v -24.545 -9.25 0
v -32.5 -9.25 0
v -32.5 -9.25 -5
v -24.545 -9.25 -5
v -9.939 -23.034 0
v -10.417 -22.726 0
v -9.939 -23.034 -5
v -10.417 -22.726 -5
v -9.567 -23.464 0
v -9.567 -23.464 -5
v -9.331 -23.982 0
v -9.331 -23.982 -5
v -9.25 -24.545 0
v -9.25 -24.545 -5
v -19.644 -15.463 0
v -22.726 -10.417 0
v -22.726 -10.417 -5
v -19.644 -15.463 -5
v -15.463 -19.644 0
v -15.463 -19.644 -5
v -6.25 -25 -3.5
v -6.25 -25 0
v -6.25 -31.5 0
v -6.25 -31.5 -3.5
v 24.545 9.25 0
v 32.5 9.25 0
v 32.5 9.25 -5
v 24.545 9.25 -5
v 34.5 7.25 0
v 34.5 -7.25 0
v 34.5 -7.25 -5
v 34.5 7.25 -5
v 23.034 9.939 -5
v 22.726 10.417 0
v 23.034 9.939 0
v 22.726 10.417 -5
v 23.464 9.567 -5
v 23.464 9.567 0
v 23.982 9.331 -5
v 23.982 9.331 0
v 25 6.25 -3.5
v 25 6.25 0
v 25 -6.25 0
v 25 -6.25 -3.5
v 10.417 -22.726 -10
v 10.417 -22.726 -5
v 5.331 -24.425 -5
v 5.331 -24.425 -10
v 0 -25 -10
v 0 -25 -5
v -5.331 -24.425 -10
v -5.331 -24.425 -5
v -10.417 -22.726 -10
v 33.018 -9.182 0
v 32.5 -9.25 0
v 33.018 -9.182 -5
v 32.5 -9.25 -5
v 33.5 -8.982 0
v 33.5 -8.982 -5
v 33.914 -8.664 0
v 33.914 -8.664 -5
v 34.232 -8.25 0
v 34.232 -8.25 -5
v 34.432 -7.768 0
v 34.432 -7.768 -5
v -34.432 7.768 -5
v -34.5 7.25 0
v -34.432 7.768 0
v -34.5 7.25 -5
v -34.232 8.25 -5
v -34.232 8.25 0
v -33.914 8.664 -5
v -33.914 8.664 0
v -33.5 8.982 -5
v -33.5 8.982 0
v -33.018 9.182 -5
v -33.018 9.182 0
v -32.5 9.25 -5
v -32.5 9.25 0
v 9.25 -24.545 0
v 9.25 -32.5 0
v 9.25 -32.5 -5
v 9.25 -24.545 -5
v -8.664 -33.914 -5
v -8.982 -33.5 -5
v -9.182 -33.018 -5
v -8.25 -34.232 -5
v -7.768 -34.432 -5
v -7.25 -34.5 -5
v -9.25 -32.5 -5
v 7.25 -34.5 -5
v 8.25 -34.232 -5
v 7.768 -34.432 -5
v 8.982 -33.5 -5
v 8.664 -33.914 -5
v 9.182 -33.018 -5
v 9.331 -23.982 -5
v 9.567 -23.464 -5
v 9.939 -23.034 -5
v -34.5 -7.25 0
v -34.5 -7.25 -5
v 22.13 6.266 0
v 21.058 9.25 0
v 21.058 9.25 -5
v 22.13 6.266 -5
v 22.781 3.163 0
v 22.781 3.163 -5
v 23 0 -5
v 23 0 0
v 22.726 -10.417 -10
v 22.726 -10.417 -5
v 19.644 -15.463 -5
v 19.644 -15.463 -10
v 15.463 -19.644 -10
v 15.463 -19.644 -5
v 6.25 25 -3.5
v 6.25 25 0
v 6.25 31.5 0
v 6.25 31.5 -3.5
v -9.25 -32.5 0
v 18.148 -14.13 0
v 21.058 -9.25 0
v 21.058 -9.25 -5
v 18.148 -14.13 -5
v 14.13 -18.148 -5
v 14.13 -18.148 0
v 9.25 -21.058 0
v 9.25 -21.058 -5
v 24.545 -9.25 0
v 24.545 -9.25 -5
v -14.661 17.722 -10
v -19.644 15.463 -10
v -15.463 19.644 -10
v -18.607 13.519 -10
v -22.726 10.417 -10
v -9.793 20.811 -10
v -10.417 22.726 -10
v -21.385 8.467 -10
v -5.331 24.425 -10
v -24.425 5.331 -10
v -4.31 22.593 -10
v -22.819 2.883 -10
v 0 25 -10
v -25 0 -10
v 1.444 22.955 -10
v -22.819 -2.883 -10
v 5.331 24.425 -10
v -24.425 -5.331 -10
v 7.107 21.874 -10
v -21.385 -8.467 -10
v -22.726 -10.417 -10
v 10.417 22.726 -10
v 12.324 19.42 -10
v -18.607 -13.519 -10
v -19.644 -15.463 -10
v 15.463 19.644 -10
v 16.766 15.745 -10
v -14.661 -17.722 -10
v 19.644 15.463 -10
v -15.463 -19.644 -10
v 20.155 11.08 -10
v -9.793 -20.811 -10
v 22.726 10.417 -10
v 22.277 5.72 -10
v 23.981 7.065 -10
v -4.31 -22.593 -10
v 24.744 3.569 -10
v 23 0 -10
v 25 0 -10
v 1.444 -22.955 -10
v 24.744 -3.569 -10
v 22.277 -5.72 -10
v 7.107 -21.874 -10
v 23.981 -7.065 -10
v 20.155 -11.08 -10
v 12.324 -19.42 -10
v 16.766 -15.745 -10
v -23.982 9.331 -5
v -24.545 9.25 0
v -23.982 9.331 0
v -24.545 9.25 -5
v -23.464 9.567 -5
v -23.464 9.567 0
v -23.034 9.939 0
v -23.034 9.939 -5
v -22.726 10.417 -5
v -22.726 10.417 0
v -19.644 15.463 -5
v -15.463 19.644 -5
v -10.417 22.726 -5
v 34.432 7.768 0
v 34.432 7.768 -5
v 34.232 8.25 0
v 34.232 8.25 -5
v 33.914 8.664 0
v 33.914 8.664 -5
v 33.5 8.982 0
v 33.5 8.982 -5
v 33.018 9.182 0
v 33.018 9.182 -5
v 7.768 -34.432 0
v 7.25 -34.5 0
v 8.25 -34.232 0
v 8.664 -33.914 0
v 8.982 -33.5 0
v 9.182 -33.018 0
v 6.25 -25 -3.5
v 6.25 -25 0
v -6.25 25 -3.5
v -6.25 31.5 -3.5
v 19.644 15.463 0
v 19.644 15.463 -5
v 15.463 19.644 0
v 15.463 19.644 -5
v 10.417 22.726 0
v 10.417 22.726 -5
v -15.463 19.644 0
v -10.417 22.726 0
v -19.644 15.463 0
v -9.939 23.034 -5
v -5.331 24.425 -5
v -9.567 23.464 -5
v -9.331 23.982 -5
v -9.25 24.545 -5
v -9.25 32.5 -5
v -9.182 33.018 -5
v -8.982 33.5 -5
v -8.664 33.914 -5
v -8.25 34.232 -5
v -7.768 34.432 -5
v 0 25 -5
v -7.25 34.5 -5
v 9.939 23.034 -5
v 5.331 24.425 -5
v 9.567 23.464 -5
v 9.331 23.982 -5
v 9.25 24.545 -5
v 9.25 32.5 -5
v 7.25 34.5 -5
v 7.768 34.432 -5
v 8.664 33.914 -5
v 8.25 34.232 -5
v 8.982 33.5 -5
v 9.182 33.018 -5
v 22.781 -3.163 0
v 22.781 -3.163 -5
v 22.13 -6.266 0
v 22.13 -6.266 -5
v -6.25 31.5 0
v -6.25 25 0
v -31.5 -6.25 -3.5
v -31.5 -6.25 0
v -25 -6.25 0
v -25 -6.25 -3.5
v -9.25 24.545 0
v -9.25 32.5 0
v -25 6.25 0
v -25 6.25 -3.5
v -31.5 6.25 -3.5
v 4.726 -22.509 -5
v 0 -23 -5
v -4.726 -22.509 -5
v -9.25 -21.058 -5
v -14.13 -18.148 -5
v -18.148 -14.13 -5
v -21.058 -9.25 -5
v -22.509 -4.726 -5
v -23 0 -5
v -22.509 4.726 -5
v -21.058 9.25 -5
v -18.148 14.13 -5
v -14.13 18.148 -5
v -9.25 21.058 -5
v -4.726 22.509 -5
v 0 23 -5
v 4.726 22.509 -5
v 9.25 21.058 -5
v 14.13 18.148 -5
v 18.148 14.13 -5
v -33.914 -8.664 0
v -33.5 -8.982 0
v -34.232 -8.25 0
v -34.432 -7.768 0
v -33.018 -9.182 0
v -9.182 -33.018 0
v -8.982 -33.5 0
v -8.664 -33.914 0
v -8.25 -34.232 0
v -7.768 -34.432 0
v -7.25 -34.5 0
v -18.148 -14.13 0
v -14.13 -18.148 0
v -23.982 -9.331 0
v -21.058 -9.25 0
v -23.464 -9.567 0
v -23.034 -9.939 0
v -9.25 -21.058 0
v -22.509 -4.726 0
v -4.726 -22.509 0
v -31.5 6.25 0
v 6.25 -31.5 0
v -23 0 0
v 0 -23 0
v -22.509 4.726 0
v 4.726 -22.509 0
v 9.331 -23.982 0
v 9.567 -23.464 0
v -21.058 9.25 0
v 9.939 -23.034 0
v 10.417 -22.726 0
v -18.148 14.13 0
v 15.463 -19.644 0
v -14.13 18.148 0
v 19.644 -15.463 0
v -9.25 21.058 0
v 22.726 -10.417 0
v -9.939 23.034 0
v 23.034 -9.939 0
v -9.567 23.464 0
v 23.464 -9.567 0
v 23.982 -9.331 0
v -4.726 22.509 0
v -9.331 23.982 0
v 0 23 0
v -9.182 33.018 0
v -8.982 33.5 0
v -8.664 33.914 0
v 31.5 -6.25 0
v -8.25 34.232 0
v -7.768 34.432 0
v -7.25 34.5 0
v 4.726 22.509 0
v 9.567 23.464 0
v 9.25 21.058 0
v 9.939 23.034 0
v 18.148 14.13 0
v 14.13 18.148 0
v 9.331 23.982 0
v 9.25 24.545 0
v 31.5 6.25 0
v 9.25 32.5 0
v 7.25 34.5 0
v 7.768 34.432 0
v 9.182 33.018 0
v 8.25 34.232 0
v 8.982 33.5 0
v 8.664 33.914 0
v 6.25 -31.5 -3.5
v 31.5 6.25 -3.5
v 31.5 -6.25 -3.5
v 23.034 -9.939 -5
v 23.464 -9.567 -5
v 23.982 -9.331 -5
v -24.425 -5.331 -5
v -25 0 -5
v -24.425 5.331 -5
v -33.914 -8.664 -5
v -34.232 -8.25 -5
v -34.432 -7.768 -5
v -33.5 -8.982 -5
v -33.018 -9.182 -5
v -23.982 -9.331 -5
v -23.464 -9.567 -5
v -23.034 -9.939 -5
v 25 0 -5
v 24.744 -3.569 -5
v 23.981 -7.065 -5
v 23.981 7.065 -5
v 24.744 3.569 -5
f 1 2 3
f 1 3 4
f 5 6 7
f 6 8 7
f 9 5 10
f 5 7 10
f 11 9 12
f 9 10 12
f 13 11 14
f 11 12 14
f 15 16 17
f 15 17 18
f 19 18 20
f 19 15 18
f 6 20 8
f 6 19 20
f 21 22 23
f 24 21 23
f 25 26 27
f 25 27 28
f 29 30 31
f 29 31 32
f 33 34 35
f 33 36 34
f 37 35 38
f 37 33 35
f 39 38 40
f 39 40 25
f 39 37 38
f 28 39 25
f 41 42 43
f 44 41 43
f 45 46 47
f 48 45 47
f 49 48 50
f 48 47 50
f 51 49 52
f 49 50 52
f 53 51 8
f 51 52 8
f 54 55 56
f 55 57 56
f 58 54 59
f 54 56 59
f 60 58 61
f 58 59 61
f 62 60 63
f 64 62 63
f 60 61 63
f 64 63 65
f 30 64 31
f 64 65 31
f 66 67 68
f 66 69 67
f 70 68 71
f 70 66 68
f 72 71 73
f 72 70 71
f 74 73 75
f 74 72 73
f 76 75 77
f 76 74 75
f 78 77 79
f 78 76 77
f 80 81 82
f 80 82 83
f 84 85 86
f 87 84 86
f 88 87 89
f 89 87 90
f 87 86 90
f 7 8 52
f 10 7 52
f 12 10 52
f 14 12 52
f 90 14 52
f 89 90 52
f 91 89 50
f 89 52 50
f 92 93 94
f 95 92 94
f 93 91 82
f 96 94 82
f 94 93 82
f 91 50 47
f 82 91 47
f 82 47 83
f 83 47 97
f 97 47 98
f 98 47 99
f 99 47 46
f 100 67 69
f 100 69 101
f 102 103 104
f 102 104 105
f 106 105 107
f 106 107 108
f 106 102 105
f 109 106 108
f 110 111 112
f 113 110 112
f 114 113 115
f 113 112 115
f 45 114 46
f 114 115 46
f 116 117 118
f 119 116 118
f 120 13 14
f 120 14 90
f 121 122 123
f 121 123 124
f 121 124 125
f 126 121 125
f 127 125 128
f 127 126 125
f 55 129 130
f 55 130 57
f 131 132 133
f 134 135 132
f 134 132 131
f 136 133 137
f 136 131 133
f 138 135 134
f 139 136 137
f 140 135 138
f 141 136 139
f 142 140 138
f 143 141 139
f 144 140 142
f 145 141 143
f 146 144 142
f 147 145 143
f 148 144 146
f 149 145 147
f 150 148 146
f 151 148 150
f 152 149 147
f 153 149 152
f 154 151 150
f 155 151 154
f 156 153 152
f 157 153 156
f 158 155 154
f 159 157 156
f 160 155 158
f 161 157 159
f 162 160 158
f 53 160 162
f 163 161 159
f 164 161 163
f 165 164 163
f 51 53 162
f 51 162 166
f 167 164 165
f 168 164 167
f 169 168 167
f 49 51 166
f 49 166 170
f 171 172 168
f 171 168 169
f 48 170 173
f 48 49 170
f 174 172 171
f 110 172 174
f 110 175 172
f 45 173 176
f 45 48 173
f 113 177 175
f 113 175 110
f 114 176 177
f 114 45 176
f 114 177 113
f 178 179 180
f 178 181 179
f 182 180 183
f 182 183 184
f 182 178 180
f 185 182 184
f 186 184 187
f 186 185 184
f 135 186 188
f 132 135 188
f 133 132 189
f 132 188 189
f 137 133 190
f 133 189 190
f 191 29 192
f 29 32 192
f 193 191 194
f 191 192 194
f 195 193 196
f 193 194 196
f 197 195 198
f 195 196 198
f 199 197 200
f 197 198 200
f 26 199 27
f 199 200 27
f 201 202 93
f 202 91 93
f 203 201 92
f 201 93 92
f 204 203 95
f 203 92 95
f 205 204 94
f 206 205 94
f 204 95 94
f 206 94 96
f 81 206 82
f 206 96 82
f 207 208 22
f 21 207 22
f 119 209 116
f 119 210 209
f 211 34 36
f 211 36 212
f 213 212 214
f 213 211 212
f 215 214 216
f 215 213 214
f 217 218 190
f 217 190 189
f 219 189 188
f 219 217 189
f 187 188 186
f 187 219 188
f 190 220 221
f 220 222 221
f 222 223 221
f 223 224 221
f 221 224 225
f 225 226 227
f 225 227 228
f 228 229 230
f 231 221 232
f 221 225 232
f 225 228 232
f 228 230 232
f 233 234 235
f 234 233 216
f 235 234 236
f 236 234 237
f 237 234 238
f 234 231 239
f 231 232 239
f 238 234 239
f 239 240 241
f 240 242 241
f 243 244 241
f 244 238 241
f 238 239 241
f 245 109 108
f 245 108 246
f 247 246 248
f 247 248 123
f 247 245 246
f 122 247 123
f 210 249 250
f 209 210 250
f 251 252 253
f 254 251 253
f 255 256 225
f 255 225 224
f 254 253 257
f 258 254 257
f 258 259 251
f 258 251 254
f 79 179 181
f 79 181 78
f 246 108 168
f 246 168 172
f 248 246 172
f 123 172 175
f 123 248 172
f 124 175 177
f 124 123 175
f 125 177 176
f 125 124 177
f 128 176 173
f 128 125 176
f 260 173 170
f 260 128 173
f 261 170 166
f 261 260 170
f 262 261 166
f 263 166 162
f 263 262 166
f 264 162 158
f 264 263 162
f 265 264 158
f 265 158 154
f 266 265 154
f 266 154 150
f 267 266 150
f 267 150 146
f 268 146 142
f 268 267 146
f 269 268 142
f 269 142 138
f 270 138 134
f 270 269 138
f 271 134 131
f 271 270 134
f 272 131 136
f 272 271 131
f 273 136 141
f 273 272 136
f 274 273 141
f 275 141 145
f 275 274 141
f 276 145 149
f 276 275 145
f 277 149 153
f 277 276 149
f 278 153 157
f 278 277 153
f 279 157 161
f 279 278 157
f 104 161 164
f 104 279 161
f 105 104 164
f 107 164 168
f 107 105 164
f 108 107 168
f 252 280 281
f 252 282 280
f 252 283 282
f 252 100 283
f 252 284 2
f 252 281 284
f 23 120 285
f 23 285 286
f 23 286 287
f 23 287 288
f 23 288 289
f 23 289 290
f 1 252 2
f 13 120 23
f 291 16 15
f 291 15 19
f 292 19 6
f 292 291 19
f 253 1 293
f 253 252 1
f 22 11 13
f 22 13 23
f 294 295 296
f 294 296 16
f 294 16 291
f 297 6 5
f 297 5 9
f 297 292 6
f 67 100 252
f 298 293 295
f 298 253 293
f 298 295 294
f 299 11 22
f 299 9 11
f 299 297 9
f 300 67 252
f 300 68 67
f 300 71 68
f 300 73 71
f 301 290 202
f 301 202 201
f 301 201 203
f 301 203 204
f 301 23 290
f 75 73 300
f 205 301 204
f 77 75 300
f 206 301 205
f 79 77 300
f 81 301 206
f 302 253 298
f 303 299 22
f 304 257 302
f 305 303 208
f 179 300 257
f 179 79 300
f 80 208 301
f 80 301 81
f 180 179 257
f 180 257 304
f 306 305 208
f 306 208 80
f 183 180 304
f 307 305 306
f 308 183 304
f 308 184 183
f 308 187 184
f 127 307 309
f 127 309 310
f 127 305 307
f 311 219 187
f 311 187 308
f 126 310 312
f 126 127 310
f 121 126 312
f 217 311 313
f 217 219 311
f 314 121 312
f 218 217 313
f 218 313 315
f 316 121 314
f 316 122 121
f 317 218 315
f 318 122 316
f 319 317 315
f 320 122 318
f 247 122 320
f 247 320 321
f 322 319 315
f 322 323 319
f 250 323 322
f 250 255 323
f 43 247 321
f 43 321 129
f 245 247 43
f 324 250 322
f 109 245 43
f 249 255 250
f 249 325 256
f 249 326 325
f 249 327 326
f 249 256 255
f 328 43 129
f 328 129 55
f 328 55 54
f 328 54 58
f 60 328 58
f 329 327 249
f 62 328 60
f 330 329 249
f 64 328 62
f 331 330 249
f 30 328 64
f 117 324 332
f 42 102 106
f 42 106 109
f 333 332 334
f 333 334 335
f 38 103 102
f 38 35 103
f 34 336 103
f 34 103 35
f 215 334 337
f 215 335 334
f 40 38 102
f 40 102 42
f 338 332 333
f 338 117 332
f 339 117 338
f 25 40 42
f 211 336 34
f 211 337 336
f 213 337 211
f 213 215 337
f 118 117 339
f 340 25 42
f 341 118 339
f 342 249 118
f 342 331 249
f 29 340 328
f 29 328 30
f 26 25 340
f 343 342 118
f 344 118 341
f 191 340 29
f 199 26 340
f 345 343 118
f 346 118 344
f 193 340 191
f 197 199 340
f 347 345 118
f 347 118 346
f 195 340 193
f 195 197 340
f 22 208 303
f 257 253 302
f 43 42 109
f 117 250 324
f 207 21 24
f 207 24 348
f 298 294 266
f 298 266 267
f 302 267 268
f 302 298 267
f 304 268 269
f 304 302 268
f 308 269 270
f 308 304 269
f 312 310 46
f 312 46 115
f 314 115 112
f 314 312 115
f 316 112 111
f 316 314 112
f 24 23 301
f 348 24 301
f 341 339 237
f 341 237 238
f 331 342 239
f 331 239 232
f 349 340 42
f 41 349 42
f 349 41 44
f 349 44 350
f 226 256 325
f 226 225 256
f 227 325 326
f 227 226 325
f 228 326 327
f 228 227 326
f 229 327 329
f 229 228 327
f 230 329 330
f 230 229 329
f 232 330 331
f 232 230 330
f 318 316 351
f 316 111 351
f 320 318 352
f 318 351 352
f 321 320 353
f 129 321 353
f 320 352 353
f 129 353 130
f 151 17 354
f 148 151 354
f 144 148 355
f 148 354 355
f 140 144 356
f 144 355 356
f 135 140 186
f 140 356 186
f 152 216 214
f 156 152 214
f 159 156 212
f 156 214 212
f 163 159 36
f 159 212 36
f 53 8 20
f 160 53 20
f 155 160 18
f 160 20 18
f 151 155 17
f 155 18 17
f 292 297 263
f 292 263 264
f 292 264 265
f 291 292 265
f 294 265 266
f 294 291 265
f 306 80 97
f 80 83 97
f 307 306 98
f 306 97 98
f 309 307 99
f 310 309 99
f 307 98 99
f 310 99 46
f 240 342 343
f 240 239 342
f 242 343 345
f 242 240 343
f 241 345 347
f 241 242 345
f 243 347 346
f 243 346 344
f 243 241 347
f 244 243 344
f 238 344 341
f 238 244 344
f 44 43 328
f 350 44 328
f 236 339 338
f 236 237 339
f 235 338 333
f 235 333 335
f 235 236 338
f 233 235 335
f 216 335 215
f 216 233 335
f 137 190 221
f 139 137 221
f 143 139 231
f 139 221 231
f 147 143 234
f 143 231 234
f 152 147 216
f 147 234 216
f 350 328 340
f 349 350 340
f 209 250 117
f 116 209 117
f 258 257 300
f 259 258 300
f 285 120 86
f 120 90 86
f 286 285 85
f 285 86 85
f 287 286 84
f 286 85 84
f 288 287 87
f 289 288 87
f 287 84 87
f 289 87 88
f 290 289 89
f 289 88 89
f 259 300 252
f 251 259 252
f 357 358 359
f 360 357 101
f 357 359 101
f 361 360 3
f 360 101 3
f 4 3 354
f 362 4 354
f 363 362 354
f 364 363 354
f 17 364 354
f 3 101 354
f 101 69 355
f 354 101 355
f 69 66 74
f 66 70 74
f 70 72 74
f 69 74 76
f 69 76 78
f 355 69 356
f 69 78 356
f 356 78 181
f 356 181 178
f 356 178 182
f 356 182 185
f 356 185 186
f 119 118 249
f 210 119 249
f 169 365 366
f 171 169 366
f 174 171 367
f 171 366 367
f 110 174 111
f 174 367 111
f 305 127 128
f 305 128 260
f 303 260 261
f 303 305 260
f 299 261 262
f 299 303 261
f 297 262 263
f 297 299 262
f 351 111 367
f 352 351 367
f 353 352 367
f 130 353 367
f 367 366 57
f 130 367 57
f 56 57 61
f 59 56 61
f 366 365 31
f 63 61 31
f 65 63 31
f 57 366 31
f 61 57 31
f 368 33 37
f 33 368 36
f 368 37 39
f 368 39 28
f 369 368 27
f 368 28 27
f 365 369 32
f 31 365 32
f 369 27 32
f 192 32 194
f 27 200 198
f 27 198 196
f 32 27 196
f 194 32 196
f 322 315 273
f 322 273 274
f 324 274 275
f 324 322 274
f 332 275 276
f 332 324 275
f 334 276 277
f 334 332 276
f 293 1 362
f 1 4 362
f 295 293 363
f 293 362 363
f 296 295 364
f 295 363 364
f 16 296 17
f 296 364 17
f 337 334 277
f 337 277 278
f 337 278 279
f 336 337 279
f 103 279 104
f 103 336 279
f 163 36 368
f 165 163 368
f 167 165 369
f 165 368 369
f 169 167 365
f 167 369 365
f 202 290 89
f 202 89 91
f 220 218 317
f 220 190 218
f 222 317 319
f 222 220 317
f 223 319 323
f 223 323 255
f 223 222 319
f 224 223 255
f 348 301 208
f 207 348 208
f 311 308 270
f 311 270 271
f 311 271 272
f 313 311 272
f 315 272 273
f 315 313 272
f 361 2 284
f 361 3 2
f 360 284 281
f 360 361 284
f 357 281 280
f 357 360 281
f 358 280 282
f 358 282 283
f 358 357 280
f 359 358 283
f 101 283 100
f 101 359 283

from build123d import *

# Parameters (mm, degrees)
F1_DEPTH = 5
F2_DEPTH = 3.5
F3_R     = 2
F4_R     = 23
F5_DEPTH = 5


# Not quite as in the source:
# - a feature names something its author has since deleted; it is built from what else it names


with BuildPart() as f1:
    # F0 (on Top) → F1 (new body)
    with BuildSketch(Plane.XY):
        with BuildLine():
            ThreePointArc((-25, 0), (-24.5524423049, 4.7093074719), (-23.2257938508, 9.25))
            Line((-23.2257938508, 9.25), (-34.5, 9.25))
            Line((-34.5, 9.25), (-34.5, -9.25))
            Line((-34.5, -9.25), (-23.2257938508, -9.25))
            ThreePointArc((-23.2257938508, -9.25), (-24.5524423049, -4.7093074719), (-25, 0))
        make_face()
        Polygon((-25, 6.25), (-25, 0), (-25, -6.25), (-31.5, -6.25), (-31.5, 6.25), align=None, mode=Mode.SUBTRACT)
        with BuildLine():
            Line((34.5, 9.25), (23.2257938508, 9.25))
            ThreePointArc((23.2257938508, 9.25), (24.5524423049, 4.7093074719), (25, 0))
            ThreePointArc((25, 0), (24.5524423049, -4.7093074719), (23.2257938508, -9.25))
            Line((23.2257938508, -9.25), (34.5, -9.25))
            Line((34.5, -9.25), (34.5, 9.25))
        make_face()
        Polygon((25, -6.25), (25, 0), (25, 6.25), (31.5, 6.25), (31.5, -6.25), align=None, mode=Mode.SUBTRACT)
        Polygon((-25, -6.25), (-25, 0), (-25, 6.25), (-31.5, 6.25), (-31.5, -6.25), align=None)
        Polygon((25, 6.25), (25, 0), (25, -6.25), (31.5, -6.25), (31.5, 6.25), align=None)
        with BuildLine():
            ThreePointArc((21.0579557412, 9.25), (22.5092534533, 4.7258342095), (23, 0))
            ThreePointArc((23, 0), (22.5092534533, -4.7258342095), (21.0579557412, -9.25))
            Line((21.0579557412, -9.25), (23.2257938508, -9.25))
            ThreePointArc((23.2257938508, -9.25), (24.5524423049, -4.7093074719), (25, 0))
            ThreePointArc((25, 0), (24.5524423049, 4.7093074719), (23.2257938508, 9.25))
            Line((23.2257938508, 9.25), (21.0579557412, 9.25))
        make_face()
        with BuildLine():
            ThreePointArc((9.25, 21.0579557412), (16.2634559673, 16.2634559673), (21.0579557412, 9.25))
            Line((21.0579557412, 9.25), (23.2257938508, 9.25))
            ThreePointArc((23.2257938508, 9.25), (17.6776695297, 17.6776695297), (9.25, 23.2257938508))
            Line((9.25, 23.2257938508), (9.25, 21.0579557412))
        make_face()
        with BuildLine():
            ThreePointArc((-21.0579557412, 9.25), (-16.2634559673, 16.2634559673), (-9.25, 21.0579557412))
            Line((-9.25, 21.0579557412), (-9.25, 23.2257938508))
            ThreePointArc((-9.25, 23.2257938508), (-17.6776695297, 17.6776695297), (-23.2257938508, 9.25))
            Line((-23.2257938508, 9.25), (-21.0579557412, 9.25))
        make_face()
        with BuildLine():
            Line((-9.25, -23.2257938508), (-9.25, -21.0579557412))
            ThreePointArc((-9.25, -21.0579557412), (-16.2634559673, -16.2634559673), (-21.0579557412, -9.25))
            Line((-21.0579557412, -9.25), (-23.2257938508, -9.25))
            ThreePointArc((-23.2257938508, -9.25), (-17.6776695297, -17.6776695297), (-9.25, -23.2257938508))
        make_face()
        with BuildLine():
            ThreePointArc((-21.0579557412, -9.25), (-23, 0), (-21.0579557412, 9.25))
            Line((-21.0579557412, 9.25), (-23.2257938508, 9.25))
            ThreePointArc((-23.2257938508, 9.25), (-24.5524423049, 4.7093074719), (-25, 0))
            ThreePointArc((-25, 0), (-24.5524423049, -4.7093074719), (-23.2257938508, -9.25))
            Line((-23.2257938508, -9.25), (-21.0579557412, -9.25))
        make_face()
        with BuildLine():
            ThreePointArc((-9.25, 21.0579557412), (0, 23), (9.25, 21.0579557412))
            Line((9.25, 21.0579557412), (9.25, 23.2257938508))
            ThreePointArc((9.25, 23.2257938508), (4.7093074719, 24.5524423049), (0, 25))
            ThreePointArc((0, 25), (-4.7093074719, 24.5524423049), (-9.25, 23.2257938508))
            Line((-9.25, 23.2257938508), (-9.25, 21.0579557412))
        make_face()
        with BuildLine():
            Line((23.2257938508, -9.25), (21.0579557412, -9.25))
            ThreePointArc((21.0579557412, -9.25), (16.2634559673, -16.2634559673), (9.25, -21.0579557412))
            Line((9.25, -21.0579557412), (9.25, -23.2257938508))
            ThreePointArc((9.25, -23.2257938508), (17.6776695297, -17.6776695297), (23.2257938508, -9.25))
        make_face()
        with BuildLine():
            Line((9.25, -23.2257938508), (9.25, -21.0579557412))
            ThreePointArc((9.25, -21.0579557412), (0, -23), (-9.25, -21.0579557412))
            Line((-9.25, -21.0579557412), (-9.25, -23.2257938508))
            ThreePointArc((-9.25, -23.2257938508), (-4.7093074719, -24.5524423049), (0, -25))
            ThreePointArc((0, -25), (4.7093074719, -24.5524423049), (9.25, -23.2257938508))
        make_face()
        with BuildLine():
            Line((9.25, -34.5), (9.25, -23.2257938508))
            ThreePointArc((9.25, -23.2257938508), (4.7093074719, -24.5524423049), (0, -25))
            ThreePointArc((0, -25), (-4.7093074719, -24.5524423049), (-9.25, -23.2257938508))
            Line((-9.25, -23.2257938508), (-9.25, -34.5))
            Line((-9.25, -34.5), (9.25, -34.5))
        make_face()
        Polygon((-6.25, -25), (0, -25), (6.25, -25), (6.25, -31.5), (-6.25, -31.5), align=None, mode=Mode.SUBTRACT)
        Polygon((6.25, -25), (0, -25), (-6.25, -25), (-6.25, -31.5), (6.25, -31.5), align=None)
        with BuildLine():
            ThreePointArc((0, 25), (4.7093074719, 24.5524423049), (9.25, 23.2257938508))
            Line((9.25, 23.2257938508), (9.25, 34.5))
            Line((9.25, 34.5), (-9.25, 34.5))
            Line((-9.25, 34.5), (-9.25, 23.2257938508))
            ThreePointArc((-9.25, 23.2257938508), (-4.7093074719, 24.5524423049), (0, 25))
        make_face()
        Polygon((6.25, 25), (0, 25), (-6.25, 25), (-6.25, 31.5), (6.25, 31.5), align=None, mode=Mode.SUBTRACT)
        Polygon((-6.25, 25), (0, 25), (6.25, 25), (6.25, 31.5), (-6.25, 31.5), align=None)
    extrude(amount=-F1_DEPTH)

    # F0 (on Top) → F2 (cut)
    with BuildSketch(Plane.XY):
        Polygon((-25, -6.25), (-25, 0), (-25, 6.25), (-31.5, 6.25), (-31.5, -6.25), align=None)
        Polygon((25, 6.25), (25, 0), (25, -6.25), (31.5, -6.25), (31.5, 6.25), align=None)
        Polygon((-6.25, 25), (0, 25), (6.25, 25), (6.25, 31.5), (-6.25, 31.5), align=None)
        Polygon((6.25, -25), (0, -25), (-6.25, -25), (-6.25, -31.5), (6.25, -31.5), align=None)
    extrude(amount=-F2_DEPTH, mode=Mode.SUBTRACT)

    # F3
    f3_edges = [f1.edges().sort_by_distance(p)[0] for p in [
        (-34.5, 9.25, -2.5),
        (-34.5, -9.25, -2.5),
        (34.5, 9.25, -2.5),
        (23.225794, -9.25, -2.5),
        (34.5, -9.25, -2.5),
        (-23.225794, -9.25, -2.5),
        (23.225794, 9.25, -2.5),
        (9.25, 34.5, -2.5),
        (9.25, 23.225794, -2.5),
        (9.25, -34.5, -2.5),
        (-9.25, -34.5, -2.5),
        (-9.25, -23.225794, -2.5),
        (9.25, -23.225794, -2.5),
        (-9.25, 34.5, -2.5),
        (-9.25, 23.225794, -2.5),
        (-23.225794, 9.25, -2.5),
    ]]
    fillet(f3_edges, radius=F3_R)

    # F4 (on face) → F5 (join)
    with BuildSketch(Plane(origin=(0, 0, -5), x_dir=(1, 0, 0), z_dir=(0, 0, -1))):
        with BuildLine():
            ThreePointArc((22.7264835722, -10.4166666667), (24.4250085906, -5.330943195), (25, 0))
            ThreePointArc((25, 0), (24.4250085906, 5.330943195), (22.7264835722, 10.4166666667))
            ThreePointArc((22.7264835722, 10.4166666667), (17.6776695297, 17.6776695297), (10.4166666667, 22.7264835722))
            ThreePointArc((10.4166666667, 22.7264835722), (0, 25), (-10.4166666667, 22.7264835722))
            ThreePointArc((-10.4166666667, 22.7264835722), (-17.6776695297, 17.6776695297), (-22.7264835722, 10.4166666667))
            ThreePointArc((-22.7264835722, 10.4166666667), (-25, 0), (-22.7264835722, -10.4166666667))
            ThreePointArc((-22.7264835722, -10.4166666667), (-17.6776695297, -17.6776695297), (-10.4166666667, -22.7264835722))
            ThreePointArc((-10.4166666667, -22.7264835722), (0, -25), (10.4166666667, -22.7264835722))
            ThreePointArc((10.4166666667, -22.7264835722), (17.6776695297, -17.6776695297), (22.7264835722, -10.4166666667))
        make_face()
        Circle(F4_R, mode=Mode.SUBTRACT)
    extrude(amount=F5_DEPTH)


solid = f1.part
